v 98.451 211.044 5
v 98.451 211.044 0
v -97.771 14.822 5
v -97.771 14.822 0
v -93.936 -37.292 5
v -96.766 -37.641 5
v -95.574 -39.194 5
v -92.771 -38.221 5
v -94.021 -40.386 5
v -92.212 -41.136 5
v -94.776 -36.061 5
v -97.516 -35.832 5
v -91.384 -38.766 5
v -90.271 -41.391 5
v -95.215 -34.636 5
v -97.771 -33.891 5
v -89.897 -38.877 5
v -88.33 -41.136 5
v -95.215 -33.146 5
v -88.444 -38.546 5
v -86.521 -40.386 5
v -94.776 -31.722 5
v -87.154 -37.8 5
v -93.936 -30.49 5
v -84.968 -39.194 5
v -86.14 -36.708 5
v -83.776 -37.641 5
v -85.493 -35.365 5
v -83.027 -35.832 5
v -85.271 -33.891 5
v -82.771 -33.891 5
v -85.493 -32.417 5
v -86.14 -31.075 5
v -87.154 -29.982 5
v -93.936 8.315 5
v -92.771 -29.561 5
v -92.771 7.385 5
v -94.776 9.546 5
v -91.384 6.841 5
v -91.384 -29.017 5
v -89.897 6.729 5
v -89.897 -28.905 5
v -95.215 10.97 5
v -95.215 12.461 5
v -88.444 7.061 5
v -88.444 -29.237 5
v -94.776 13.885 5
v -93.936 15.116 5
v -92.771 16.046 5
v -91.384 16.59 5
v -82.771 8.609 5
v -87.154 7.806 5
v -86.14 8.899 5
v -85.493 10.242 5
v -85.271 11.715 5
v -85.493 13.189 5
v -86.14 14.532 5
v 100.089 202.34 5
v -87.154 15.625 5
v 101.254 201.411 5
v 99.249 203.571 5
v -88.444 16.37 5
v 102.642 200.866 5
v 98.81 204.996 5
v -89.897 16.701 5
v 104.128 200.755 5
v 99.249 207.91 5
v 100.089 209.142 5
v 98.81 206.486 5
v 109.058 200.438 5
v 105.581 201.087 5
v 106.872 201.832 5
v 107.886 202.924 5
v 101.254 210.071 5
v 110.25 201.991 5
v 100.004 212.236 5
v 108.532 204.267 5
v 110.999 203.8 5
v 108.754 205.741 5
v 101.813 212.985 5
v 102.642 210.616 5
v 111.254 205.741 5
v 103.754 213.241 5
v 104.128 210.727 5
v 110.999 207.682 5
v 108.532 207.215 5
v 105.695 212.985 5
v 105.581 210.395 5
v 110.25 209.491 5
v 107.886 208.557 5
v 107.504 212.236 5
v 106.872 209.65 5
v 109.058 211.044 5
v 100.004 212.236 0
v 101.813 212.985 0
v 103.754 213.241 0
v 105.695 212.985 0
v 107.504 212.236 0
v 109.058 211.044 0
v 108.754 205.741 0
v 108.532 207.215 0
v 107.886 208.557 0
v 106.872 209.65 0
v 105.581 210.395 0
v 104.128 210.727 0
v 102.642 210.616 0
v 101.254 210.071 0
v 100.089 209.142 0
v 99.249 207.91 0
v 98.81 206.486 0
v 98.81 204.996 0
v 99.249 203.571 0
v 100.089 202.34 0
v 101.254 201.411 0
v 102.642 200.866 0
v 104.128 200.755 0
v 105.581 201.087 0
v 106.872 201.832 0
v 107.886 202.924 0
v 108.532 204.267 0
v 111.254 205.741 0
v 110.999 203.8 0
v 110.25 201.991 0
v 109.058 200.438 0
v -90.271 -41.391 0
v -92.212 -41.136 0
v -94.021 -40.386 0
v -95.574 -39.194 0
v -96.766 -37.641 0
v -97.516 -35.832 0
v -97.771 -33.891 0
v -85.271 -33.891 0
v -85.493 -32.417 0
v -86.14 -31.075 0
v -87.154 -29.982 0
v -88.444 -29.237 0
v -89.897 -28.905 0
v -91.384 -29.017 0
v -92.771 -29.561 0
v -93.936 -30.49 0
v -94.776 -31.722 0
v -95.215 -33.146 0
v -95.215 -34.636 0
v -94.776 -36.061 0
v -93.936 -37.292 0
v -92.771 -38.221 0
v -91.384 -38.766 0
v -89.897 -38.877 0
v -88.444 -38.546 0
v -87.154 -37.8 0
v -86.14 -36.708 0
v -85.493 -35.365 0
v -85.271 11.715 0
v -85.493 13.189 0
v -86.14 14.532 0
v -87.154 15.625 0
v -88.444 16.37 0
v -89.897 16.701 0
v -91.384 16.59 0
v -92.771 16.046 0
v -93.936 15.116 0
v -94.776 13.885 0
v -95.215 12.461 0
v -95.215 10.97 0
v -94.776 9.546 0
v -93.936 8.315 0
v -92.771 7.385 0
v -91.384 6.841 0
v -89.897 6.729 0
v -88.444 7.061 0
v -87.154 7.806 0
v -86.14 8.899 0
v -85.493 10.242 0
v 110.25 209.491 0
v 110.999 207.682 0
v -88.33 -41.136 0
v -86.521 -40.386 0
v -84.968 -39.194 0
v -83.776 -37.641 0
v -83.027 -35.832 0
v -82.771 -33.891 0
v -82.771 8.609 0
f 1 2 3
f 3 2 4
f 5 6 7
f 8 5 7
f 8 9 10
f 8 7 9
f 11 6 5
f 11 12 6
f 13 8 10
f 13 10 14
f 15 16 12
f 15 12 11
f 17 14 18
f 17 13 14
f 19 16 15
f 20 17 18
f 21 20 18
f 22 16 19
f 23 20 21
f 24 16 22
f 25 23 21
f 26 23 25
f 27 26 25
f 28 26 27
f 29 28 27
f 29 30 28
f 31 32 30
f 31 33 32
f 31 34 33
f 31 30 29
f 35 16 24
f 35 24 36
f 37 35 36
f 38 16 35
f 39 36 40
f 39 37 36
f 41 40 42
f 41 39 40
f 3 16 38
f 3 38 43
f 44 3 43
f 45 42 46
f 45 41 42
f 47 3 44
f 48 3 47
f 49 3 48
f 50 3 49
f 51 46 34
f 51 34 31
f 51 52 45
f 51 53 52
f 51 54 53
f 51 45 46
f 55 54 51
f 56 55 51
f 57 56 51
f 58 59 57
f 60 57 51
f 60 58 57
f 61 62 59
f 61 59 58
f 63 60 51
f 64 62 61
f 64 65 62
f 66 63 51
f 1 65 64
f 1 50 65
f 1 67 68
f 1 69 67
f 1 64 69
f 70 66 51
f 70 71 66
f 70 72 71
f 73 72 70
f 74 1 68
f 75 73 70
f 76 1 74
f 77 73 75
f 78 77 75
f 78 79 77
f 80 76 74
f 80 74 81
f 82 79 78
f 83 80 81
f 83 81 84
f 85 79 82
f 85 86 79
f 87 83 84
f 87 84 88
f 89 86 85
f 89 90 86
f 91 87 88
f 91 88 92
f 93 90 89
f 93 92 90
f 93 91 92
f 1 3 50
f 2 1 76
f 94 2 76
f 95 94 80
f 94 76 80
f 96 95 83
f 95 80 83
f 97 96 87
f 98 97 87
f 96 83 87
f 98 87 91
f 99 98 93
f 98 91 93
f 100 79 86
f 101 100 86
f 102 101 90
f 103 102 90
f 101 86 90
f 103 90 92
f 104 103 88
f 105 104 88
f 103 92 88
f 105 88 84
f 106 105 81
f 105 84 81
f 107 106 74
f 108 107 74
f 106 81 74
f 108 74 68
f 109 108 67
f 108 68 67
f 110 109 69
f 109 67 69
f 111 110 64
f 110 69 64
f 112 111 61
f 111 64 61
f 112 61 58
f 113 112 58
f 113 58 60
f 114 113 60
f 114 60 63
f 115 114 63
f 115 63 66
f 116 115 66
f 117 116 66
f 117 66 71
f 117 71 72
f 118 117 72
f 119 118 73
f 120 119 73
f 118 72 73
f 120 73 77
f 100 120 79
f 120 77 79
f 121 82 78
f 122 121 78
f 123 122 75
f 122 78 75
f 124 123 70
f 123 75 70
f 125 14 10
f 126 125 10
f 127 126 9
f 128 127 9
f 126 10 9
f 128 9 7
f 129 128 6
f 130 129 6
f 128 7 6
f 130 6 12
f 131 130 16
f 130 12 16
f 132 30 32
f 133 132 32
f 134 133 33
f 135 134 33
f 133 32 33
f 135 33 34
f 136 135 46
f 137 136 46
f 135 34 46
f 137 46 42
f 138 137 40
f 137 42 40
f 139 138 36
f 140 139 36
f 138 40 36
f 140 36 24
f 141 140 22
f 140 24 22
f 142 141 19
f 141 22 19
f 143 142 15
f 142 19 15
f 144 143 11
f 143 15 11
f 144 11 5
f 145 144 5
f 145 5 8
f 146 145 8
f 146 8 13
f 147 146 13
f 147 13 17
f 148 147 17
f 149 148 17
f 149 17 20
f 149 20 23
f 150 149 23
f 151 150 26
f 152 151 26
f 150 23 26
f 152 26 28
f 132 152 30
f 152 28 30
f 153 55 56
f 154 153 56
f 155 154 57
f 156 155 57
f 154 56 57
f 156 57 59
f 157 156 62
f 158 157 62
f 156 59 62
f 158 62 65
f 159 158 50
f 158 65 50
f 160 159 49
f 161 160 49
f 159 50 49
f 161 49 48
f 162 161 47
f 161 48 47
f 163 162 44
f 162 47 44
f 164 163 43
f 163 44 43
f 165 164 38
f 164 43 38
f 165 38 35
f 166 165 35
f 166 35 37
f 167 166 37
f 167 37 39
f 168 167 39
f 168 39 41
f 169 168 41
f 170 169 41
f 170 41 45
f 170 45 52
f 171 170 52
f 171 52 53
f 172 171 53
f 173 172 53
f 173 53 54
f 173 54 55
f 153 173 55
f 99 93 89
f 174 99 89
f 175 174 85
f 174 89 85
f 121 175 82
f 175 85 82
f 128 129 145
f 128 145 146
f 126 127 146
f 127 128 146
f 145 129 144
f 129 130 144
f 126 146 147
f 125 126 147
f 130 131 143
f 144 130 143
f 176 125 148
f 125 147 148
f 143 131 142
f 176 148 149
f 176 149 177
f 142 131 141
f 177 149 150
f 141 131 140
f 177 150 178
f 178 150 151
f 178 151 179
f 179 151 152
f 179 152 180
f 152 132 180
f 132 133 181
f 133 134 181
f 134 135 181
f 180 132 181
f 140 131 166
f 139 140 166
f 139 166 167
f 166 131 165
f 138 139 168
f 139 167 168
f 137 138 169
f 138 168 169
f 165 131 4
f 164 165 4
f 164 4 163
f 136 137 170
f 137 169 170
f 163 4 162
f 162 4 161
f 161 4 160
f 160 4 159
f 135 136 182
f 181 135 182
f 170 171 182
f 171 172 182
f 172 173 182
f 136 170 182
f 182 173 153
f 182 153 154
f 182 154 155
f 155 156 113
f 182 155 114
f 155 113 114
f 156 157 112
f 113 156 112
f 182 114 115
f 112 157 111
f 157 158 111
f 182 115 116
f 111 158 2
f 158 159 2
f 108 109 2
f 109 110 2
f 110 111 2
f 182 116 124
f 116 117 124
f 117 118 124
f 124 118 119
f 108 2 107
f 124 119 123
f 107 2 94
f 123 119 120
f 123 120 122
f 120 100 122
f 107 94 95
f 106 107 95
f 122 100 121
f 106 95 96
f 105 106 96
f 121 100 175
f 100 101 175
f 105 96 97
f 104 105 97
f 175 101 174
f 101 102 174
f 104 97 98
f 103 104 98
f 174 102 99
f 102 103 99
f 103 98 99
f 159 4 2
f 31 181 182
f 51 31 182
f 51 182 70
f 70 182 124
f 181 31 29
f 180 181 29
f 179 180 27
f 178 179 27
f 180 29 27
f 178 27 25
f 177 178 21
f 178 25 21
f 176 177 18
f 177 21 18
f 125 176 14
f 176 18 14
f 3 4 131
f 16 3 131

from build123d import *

# Parameters (mm, degrees)
BOSS_EXTRUDE1_DEPTH = 5
SKETCH2_R           = 5
CUT_EXTRUDE1_DEPTH  = 5
SKETCH3_R           = 5
CUT_EXTRUDE2_DEPTH  = 6


with BuildPart() as part:
    # Sketch1 → Boss-Extrude1 (new body)
    with BuildSketch(Plane.XY):
        Polygon((-97.771110706, 14.82204599), (-97.771110706, -41.391157445), (-82.771110706, -41.391157445), (-82.771110706, 8.608842555), (114.36092365, 205.740876911), (103.754321932, 216.347478628), align=None)
    extrude(amount=BOSS_EXTRUDE1_DEPTH)

    # Sketch2 → Cut-Extrude1 (cut)
    with BuildSketch(Plane.XY.offset(5)):
        with Locations((-90.271110706, -33.891157445)):
            Circle(SKETCH2_R)
        with BuildLine():
            ThreePointArc((-90.271110669, -41.391157445), (-95.574411596, -39.194458273), (-97.771110706, -33.891157321))
            Line((-97.771110706, -33.891157321), (-97.771110706, -41.391157445))
            Line((-97.771110706, -41.391157445), (-90.271110669, -41.391157445))
        make_face()
        with BuildLine():
            Line((-82.771110706, -41.391157445), (-82.771110706, -33.891157445))
            ThreePointArc((-82.771110706, -33.891157445), (-84.967809834, -39.194458291), (-90.271110669, -41.391157445))
            Line((-90.271110669, -41.391157445), (-82.771110706, -41.391157445))
        make_face()
        with Locations((103.754321932, 205.740876911)):
            Circle(SKETCH2_R)
        with BuildLine():
            Line((109.057622903, 211.044177658), (103.754321932, 216.347478628))
            Line((103.754321932, 216.347478628), (98.451021073, 211.04417777))
            ThreePointArc((98.451021073, 211.04417777), (103.754322011, 213.240876911), (109.057622903, 211.044177658))
        make_face()
        with BuildLine():
            Line((114.36092365, 205.740876911), (109.057622903, 211.044177658))
            ThreePointArc((109.057622903, 211.044177658), (110.683418456, 208.61100258), (111.254321932, 205.740876911))
            ThreePointArc((111.254321932, 205.740876911), (110.683418433, 202.870751185), (109.057622817, 200.437576078))
            Line((109.057622817, 200.437576078), (114.36092365, 205.740876911))
        make_face()
    extrude(amount=-CUT_EXTRUDE1_DEPTH, mode=Mode.SUBTRACT)

    # Sketch3 → Cut-Extrude2 (cut, through all)
    with BuildSketch(Plane.XY.offset(5)):
        with Locations((-90.271110706, 11.715444272)):
            Circle(SKETCH3_R)
    extrude(amount=-CUT_EXTRUDE2_DEPTH, mode=Mode.SUBTRACT)


solid = part.part
